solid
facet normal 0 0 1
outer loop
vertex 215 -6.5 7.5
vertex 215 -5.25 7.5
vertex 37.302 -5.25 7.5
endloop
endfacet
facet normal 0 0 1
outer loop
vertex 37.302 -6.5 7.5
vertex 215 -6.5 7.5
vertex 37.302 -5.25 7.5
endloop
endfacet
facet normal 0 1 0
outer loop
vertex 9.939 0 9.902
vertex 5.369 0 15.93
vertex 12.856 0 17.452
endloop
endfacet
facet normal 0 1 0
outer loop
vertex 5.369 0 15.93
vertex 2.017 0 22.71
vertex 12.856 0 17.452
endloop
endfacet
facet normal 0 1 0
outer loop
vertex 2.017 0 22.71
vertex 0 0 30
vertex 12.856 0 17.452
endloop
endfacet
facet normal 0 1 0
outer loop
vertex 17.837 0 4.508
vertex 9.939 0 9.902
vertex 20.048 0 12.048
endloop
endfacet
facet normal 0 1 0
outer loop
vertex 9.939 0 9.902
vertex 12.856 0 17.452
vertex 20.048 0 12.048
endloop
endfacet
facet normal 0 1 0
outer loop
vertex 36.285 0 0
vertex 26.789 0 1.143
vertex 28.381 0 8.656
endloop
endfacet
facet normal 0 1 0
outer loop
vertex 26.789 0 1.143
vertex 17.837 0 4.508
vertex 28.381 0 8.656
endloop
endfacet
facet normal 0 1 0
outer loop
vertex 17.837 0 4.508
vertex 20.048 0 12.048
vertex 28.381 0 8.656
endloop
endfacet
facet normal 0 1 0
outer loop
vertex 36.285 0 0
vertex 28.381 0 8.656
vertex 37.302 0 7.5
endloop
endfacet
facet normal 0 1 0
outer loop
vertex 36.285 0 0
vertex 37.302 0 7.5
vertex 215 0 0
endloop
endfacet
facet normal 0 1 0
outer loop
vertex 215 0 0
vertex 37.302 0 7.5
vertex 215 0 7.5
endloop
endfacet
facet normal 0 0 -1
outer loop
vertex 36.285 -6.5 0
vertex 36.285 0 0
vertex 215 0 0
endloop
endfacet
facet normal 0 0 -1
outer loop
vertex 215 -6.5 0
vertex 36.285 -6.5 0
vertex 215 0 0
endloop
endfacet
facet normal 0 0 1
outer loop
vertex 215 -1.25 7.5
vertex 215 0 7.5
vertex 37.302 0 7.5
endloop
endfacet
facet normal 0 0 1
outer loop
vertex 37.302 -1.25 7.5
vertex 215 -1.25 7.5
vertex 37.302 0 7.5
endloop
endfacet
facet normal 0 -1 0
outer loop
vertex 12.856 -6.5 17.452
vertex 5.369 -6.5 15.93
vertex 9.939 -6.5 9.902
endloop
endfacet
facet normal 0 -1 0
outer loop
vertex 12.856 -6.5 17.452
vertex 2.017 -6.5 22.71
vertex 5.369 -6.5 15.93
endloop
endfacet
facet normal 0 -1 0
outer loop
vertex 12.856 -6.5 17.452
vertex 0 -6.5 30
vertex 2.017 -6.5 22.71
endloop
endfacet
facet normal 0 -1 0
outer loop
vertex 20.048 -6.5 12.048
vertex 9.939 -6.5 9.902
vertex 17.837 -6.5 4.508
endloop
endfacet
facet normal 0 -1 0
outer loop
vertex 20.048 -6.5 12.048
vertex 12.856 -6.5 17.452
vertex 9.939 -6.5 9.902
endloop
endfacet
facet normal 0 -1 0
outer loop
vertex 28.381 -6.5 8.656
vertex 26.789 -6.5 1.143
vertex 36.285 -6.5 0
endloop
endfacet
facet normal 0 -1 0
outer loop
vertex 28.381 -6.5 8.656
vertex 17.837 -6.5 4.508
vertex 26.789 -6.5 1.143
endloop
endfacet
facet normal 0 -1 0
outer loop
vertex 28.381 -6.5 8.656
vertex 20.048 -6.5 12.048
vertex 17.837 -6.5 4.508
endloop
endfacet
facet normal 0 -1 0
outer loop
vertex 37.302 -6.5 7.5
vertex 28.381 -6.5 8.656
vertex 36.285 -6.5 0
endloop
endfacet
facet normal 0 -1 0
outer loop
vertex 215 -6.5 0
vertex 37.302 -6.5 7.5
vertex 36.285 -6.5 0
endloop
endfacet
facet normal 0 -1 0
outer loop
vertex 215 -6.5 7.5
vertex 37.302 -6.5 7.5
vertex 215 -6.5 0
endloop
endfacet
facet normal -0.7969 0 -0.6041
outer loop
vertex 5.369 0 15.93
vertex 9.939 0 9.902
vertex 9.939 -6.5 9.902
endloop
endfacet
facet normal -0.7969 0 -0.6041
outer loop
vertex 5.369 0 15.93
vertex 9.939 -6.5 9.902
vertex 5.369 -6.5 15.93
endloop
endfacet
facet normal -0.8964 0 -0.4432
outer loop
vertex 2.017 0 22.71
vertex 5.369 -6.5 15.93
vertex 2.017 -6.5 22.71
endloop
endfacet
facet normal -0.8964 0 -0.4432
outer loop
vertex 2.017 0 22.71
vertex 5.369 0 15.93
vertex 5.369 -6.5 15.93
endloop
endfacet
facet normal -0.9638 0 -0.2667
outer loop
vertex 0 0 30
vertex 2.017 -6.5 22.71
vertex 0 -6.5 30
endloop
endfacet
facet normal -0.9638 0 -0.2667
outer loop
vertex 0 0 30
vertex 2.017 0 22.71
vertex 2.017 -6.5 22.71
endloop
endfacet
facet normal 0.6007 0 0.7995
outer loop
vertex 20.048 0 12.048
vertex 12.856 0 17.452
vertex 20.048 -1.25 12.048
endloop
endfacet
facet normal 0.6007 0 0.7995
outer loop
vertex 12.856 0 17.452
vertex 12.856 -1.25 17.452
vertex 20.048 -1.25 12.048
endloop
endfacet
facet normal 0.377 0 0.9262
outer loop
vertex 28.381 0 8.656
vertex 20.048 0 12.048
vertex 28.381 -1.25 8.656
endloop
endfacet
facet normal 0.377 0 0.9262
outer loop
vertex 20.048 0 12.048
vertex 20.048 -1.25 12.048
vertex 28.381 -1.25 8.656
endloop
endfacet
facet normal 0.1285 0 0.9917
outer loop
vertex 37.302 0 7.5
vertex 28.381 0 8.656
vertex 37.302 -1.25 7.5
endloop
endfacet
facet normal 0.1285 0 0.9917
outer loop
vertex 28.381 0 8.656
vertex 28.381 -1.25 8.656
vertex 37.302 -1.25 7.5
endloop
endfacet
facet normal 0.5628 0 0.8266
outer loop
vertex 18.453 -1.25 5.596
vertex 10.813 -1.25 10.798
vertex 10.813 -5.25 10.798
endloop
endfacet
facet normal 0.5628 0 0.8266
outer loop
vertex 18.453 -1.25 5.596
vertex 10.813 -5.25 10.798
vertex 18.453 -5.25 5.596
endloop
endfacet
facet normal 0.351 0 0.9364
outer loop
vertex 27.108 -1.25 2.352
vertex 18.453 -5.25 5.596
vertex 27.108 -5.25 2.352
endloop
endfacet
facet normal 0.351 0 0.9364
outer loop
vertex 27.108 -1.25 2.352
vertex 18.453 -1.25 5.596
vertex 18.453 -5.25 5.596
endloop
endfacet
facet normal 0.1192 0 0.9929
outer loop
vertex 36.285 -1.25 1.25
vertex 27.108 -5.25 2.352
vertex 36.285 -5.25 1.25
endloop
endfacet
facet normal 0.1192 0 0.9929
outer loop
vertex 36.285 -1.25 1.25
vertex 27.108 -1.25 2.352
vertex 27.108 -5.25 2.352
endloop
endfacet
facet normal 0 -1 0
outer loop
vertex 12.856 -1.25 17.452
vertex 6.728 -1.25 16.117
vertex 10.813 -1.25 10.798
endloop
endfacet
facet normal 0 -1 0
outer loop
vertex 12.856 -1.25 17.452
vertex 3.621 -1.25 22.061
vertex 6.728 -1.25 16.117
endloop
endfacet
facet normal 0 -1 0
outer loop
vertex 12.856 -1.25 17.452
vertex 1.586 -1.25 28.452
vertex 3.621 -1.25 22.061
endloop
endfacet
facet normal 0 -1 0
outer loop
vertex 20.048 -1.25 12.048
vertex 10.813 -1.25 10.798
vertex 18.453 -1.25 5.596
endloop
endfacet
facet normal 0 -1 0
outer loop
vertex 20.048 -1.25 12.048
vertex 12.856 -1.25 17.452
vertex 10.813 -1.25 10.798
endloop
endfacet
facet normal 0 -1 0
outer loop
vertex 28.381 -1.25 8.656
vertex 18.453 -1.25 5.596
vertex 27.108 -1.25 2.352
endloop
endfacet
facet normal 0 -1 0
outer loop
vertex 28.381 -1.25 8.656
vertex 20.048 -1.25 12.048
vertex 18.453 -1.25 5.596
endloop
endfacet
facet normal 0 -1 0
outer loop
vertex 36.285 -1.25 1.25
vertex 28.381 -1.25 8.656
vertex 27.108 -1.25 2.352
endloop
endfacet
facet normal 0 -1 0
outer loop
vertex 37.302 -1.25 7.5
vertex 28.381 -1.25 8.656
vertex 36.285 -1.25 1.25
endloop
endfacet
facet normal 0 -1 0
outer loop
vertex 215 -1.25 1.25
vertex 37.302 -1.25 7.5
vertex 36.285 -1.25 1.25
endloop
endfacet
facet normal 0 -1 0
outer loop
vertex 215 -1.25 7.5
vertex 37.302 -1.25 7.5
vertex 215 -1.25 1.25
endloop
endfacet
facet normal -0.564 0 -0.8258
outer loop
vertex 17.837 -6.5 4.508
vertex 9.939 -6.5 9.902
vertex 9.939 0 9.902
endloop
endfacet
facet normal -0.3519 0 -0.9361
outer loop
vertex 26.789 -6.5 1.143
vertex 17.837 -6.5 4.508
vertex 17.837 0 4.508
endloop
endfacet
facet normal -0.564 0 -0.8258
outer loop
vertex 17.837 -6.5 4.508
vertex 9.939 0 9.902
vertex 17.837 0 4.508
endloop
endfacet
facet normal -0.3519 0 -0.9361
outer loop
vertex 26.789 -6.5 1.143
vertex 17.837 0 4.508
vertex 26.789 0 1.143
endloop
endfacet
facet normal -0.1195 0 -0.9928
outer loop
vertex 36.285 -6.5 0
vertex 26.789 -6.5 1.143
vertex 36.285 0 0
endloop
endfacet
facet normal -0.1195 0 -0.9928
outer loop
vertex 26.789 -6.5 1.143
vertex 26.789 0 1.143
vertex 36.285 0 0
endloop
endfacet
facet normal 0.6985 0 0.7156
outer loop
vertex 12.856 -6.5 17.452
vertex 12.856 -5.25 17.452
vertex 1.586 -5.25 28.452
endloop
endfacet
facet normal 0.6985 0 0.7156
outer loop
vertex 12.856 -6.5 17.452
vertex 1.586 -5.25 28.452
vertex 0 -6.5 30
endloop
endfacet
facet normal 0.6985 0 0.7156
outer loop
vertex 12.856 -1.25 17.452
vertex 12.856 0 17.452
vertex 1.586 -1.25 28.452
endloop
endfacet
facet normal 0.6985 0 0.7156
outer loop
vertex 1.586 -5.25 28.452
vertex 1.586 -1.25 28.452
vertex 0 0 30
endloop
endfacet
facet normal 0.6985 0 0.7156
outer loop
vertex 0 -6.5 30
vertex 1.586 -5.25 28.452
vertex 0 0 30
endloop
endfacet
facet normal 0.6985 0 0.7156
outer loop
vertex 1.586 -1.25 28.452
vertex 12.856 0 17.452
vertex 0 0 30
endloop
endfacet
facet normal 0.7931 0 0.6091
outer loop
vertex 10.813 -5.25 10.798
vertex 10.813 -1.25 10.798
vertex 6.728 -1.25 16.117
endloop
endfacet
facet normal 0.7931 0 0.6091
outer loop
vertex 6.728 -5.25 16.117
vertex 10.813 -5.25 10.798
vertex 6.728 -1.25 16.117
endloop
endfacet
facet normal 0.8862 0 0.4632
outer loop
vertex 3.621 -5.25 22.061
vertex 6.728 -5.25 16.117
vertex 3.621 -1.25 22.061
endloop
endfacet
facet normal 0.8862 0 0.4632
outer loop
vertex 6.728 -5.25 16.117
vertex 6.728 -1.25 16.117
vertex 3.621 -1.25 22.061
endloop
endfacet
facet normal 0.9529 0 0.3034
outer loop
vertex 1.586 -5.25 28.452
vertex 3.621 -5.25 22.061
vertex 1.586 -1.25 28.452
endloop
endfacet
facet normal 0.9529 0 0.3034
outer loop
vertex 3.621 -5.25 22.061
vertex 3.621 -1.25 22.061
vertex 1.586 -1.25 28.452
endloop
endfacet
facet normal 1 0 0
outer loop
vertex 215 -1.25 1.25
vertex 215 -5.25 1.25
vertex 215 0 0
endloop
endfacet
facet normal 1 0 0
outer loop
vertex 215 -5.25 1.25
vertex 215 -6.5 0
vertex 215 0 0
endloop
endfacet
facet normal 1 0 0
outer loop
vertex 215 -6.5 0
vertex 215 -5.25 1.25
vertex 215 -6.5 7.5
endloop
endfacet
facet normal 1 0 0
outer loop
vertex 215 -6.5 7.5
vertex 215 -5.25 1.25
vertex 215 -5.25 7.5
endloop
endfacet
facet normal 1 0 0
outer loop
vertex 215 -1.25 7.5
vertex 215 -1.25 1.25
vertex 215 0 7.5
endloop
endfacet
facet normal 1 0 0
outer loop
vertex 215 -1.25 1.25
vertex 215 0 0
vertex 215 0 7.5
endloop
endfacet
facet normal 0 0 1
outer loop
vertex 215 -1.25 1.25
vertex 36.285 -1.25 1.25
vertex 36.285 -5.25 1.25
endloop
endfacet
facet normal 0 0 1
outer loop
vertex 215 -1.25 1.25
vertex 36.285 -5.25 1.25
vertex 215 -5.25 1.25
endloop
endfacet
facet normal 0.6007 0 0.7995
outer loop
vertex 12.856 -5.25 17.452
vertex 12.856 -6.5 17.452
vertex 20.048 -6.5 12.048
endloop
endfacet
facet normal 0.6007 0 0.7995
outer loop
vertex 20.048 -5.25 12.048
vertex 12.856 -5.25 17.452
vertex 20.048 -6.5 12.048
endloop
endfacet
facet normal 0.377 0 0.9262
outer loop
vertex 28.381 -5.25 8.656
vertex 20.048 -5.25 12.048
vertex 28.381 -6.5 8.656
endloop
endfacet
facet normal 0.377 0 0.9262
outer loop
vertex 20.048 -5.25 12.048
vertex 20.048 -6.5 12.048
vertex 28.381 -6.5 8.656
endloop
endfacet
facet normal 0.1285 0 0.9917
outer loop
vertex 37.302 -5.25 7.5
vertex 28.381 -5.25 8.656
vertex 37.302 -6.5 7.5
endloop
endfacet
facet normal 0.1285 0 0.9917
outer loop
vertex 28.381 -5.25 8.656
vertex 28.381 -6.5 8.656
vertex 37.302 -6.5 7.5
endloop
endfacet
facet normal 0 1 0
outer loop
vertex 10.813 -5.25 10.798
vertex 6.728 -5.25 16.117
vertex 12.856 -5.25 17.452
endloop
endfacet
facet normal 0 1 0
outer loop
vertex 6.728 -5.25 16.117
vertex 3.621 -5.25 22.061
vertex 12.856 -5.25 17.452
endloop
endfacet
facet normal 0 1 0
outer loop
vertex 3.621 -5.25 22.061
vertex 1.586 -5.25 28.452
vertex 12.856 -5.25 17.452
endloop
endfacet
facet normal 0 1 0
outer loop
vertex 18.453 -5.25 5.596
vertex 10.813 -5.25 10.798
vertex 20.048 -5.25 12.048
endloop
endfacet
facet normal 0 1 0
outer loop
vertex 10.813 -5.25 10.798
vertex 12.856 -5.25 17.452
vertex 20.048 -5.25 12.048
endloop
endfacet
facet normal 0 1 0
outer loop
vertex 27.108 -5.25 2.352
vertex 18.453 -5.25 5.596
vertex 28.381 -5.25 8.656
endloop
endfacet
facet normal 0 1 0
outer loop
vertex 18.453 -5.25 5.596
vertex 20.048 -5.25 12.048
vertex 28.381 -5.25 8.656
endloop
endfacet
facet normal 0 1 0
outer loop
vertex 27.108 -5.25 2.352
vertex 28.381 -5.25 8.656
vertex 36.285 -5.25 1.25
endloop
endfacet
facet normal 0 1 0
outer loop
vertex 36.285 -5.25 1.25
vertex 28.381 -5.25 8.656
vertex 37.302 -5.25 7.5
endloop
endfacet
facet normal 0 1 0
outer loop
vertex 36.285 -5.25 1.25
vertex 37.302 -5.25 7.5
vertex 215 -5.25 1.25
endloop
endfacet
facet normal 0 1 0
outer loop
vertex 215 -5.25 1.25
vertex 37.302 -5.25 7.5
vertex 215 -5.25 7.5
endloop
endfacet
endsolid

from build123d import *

# Parameters (mm, degrees)
F3_DEPTH    = 6.5
F4_T1_DEPTH = 87.9231463955
F4_T3_DEPTH = 86.4923799402
F5_R        = 35
F6_T        = -1.25


# Not quite as in the source:
# - a fillet or chamfer that OpenCascade refuses, or shapes differently, is made with other operations: its cross-section is extruded or revolved along the edge and cut away or added


with BuildPart() as f3:
    # F2 (on Front) → F3 (new body)
    with BuildSketch(Plane.XZ):
        Polygon((0, 19.5199243858), (20, 0), (215, 0), (215, 7.5), (23.0533679898, 7.5), (0, 30), align=None)
    extrude(amount=F3_DEPTH)

    # F4: fillet of radius 40 on 2 edges, made by hand

    # F4_s2 → F4_t1 (cut)
    with BuildSketch(Plane.XZ.offset(-40.7115731978)):
        with BuildLine():
            ThreePointArc((8.3460077876, 11.374252339), (21.2020218527, 2.9525310821), (36.2846292791, 0))
            Line((36.2846292791, 0), (20, 0))
            Line((20, 0), (8.3460077876, 11.374252339))
        make_face()
    extrude(amount=F4_T1_DEPTH, mode=Mode.SUBTRACT)

    # F4_s4 → F4_t3 (cut)
    with BuildSketch(Plane.XZ.offset(-39.9961899701)):
        with BuildLine():
            ThreePointArc((11.4492084149, 8.345540259), (4.0262452257, 18.2748088699), (0, 30))
            Line((0, 30), (0, 19.5199243858))
            Line((0, 19.5199243858), (11.4492084149, 8.345540259))
        make_face()
    extrude(amount=F4_T3_DEPTH, mode=Mode.SUBTRACT)

    # F5
    f5_edges = [f3.edges().sort_by_distance(p)[0] for p in [
        (23.053368, -3.25, 7.5),
    ]]
    fillet(f5_edges, radius=F5_R)

    # F6
    f6_openings = [f3.faces().sort_by_distance(p)[0] for p in [
        (6.428062, -3.25, 23.726235),
        (24.105137, -3.25, 10.083465),
        (126.151209, -3.25, 7.5),
        (215, -3.25, 3.75),
    ]]
    offset(amount=F6_T, openings=f6_openings)


solid = f3.part
